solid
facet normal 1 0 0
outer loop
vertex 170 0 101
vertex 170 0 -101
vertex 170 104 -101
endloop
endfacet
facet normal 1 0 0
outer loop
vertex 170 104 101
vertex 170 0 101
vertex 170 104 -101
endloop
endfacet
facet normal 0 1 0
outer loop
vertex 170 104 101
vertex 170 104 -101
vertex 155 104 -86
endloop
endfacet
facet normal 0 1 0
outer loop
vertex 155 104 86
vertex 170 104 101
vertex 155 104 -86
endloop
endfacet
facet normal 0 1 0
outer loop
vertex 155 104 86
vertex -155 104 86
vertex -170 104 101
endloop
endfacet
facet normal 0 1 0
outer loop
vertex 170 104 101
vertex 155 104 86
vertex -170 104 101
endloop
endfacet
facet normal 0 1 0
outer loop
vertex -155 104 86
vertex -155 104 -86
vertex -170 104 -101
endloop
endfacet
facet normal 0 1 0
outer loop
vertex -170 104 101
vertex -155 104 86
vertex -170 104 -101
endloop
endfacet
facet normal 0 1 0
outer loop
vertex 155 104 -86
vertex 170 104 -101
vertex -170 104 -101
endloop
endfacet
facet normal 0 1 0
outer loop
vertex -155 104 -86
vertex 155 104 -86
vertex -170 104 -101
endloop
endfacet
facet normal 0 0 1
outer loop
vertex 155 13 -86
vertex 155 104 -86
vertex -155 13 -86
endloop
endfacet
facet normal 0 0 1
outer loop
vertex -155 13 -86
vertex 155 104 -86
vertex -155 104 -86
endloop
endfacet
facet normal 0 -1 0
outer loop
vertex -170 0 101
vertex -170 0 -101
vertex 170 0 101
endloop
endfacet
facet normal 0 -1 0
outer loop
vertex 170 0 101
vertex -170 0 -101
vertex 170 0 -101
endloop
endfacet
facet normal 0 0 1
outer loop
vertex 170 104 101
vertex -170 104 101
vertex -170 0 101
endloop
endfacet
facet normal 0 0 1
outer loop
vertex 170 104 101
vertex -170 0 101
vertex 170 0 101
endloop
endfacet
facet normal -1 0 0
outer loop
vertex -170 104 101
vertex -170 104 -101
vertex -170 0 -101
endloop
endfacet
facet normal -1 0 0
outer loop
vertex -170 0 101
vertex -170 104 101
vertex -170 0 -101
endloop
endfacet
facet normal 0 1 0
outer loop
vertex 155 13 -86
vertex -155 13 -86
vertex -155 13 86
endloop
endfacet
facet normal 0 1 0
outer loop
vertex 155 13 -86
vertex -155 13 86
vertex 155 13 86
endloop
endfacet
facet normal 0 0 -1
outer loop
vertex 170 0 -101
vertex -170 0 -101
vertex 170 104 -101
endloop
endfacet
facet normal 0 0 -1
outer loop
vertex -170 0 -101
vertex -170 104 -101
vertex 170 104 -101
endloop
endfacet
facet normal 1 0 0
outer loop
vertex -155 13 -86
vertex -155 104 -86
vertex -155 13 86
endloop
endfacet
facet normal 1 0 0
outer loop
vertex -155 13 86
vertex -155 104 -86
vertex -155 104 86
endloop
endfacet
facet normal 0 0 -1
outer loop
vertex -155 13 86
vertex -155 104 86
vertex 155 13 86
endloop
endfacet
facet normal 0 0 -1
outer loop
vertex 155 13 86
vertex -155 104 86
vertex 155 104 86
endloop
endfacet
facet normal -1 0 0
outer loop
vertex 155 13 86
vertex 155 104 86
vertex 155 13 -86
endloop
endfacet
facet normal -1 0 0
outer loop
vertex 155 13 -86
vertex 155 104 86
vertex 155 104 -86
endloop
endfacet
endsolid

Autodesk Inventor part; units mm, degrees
ref_plane "YZ Plane" through (0, 0, 0) normal (1, 0, 0) x (0, 1, 0)
ref_plane "XZ Plane" through (0, 0, 0) normal (0, 1, 0) x (-1, 0, 0)
ref_plane "XY Plane" through (0, 0, 0) normal (0, 0, 1) x (1, 0, 0)
sketch "Skizze3" plane through (0, 0, 0) normal (0, 0, 1) x (1, 0, 0)
  line L0 (-170, 0) -> (170, 0)
  line L1 (170, 0) -> (170, 104)
  line L2 (170, 104) -> (-170, 104)
  line L3 (-170, 104) -> (-170, 0)
  point P0 (0, 0)
  dimension "d3" = 340
  dimension "d4" = 104
extrude "Extrusion1" add sketch "Skizze3" along normal mid plane 202
sketch "Skizze4" plane through (-170, 104, 101) normal (0, 1, 0) x (1, 0, 0)
  line L0 (15, 15) -> (325, 15)
  line L1 (325, 15) -> (325, 187)
  line L2 (325, 187) -> (15, 187)
  line L3 (15, 187) -> (15, 15)
  point P0 (170, 101)
  dimension "d7" = 310
  dimension "d8" = 172
extrude "Extrusion2" cut sketch "Skizze4" against normal blind 91
properties part number "wassertank"
